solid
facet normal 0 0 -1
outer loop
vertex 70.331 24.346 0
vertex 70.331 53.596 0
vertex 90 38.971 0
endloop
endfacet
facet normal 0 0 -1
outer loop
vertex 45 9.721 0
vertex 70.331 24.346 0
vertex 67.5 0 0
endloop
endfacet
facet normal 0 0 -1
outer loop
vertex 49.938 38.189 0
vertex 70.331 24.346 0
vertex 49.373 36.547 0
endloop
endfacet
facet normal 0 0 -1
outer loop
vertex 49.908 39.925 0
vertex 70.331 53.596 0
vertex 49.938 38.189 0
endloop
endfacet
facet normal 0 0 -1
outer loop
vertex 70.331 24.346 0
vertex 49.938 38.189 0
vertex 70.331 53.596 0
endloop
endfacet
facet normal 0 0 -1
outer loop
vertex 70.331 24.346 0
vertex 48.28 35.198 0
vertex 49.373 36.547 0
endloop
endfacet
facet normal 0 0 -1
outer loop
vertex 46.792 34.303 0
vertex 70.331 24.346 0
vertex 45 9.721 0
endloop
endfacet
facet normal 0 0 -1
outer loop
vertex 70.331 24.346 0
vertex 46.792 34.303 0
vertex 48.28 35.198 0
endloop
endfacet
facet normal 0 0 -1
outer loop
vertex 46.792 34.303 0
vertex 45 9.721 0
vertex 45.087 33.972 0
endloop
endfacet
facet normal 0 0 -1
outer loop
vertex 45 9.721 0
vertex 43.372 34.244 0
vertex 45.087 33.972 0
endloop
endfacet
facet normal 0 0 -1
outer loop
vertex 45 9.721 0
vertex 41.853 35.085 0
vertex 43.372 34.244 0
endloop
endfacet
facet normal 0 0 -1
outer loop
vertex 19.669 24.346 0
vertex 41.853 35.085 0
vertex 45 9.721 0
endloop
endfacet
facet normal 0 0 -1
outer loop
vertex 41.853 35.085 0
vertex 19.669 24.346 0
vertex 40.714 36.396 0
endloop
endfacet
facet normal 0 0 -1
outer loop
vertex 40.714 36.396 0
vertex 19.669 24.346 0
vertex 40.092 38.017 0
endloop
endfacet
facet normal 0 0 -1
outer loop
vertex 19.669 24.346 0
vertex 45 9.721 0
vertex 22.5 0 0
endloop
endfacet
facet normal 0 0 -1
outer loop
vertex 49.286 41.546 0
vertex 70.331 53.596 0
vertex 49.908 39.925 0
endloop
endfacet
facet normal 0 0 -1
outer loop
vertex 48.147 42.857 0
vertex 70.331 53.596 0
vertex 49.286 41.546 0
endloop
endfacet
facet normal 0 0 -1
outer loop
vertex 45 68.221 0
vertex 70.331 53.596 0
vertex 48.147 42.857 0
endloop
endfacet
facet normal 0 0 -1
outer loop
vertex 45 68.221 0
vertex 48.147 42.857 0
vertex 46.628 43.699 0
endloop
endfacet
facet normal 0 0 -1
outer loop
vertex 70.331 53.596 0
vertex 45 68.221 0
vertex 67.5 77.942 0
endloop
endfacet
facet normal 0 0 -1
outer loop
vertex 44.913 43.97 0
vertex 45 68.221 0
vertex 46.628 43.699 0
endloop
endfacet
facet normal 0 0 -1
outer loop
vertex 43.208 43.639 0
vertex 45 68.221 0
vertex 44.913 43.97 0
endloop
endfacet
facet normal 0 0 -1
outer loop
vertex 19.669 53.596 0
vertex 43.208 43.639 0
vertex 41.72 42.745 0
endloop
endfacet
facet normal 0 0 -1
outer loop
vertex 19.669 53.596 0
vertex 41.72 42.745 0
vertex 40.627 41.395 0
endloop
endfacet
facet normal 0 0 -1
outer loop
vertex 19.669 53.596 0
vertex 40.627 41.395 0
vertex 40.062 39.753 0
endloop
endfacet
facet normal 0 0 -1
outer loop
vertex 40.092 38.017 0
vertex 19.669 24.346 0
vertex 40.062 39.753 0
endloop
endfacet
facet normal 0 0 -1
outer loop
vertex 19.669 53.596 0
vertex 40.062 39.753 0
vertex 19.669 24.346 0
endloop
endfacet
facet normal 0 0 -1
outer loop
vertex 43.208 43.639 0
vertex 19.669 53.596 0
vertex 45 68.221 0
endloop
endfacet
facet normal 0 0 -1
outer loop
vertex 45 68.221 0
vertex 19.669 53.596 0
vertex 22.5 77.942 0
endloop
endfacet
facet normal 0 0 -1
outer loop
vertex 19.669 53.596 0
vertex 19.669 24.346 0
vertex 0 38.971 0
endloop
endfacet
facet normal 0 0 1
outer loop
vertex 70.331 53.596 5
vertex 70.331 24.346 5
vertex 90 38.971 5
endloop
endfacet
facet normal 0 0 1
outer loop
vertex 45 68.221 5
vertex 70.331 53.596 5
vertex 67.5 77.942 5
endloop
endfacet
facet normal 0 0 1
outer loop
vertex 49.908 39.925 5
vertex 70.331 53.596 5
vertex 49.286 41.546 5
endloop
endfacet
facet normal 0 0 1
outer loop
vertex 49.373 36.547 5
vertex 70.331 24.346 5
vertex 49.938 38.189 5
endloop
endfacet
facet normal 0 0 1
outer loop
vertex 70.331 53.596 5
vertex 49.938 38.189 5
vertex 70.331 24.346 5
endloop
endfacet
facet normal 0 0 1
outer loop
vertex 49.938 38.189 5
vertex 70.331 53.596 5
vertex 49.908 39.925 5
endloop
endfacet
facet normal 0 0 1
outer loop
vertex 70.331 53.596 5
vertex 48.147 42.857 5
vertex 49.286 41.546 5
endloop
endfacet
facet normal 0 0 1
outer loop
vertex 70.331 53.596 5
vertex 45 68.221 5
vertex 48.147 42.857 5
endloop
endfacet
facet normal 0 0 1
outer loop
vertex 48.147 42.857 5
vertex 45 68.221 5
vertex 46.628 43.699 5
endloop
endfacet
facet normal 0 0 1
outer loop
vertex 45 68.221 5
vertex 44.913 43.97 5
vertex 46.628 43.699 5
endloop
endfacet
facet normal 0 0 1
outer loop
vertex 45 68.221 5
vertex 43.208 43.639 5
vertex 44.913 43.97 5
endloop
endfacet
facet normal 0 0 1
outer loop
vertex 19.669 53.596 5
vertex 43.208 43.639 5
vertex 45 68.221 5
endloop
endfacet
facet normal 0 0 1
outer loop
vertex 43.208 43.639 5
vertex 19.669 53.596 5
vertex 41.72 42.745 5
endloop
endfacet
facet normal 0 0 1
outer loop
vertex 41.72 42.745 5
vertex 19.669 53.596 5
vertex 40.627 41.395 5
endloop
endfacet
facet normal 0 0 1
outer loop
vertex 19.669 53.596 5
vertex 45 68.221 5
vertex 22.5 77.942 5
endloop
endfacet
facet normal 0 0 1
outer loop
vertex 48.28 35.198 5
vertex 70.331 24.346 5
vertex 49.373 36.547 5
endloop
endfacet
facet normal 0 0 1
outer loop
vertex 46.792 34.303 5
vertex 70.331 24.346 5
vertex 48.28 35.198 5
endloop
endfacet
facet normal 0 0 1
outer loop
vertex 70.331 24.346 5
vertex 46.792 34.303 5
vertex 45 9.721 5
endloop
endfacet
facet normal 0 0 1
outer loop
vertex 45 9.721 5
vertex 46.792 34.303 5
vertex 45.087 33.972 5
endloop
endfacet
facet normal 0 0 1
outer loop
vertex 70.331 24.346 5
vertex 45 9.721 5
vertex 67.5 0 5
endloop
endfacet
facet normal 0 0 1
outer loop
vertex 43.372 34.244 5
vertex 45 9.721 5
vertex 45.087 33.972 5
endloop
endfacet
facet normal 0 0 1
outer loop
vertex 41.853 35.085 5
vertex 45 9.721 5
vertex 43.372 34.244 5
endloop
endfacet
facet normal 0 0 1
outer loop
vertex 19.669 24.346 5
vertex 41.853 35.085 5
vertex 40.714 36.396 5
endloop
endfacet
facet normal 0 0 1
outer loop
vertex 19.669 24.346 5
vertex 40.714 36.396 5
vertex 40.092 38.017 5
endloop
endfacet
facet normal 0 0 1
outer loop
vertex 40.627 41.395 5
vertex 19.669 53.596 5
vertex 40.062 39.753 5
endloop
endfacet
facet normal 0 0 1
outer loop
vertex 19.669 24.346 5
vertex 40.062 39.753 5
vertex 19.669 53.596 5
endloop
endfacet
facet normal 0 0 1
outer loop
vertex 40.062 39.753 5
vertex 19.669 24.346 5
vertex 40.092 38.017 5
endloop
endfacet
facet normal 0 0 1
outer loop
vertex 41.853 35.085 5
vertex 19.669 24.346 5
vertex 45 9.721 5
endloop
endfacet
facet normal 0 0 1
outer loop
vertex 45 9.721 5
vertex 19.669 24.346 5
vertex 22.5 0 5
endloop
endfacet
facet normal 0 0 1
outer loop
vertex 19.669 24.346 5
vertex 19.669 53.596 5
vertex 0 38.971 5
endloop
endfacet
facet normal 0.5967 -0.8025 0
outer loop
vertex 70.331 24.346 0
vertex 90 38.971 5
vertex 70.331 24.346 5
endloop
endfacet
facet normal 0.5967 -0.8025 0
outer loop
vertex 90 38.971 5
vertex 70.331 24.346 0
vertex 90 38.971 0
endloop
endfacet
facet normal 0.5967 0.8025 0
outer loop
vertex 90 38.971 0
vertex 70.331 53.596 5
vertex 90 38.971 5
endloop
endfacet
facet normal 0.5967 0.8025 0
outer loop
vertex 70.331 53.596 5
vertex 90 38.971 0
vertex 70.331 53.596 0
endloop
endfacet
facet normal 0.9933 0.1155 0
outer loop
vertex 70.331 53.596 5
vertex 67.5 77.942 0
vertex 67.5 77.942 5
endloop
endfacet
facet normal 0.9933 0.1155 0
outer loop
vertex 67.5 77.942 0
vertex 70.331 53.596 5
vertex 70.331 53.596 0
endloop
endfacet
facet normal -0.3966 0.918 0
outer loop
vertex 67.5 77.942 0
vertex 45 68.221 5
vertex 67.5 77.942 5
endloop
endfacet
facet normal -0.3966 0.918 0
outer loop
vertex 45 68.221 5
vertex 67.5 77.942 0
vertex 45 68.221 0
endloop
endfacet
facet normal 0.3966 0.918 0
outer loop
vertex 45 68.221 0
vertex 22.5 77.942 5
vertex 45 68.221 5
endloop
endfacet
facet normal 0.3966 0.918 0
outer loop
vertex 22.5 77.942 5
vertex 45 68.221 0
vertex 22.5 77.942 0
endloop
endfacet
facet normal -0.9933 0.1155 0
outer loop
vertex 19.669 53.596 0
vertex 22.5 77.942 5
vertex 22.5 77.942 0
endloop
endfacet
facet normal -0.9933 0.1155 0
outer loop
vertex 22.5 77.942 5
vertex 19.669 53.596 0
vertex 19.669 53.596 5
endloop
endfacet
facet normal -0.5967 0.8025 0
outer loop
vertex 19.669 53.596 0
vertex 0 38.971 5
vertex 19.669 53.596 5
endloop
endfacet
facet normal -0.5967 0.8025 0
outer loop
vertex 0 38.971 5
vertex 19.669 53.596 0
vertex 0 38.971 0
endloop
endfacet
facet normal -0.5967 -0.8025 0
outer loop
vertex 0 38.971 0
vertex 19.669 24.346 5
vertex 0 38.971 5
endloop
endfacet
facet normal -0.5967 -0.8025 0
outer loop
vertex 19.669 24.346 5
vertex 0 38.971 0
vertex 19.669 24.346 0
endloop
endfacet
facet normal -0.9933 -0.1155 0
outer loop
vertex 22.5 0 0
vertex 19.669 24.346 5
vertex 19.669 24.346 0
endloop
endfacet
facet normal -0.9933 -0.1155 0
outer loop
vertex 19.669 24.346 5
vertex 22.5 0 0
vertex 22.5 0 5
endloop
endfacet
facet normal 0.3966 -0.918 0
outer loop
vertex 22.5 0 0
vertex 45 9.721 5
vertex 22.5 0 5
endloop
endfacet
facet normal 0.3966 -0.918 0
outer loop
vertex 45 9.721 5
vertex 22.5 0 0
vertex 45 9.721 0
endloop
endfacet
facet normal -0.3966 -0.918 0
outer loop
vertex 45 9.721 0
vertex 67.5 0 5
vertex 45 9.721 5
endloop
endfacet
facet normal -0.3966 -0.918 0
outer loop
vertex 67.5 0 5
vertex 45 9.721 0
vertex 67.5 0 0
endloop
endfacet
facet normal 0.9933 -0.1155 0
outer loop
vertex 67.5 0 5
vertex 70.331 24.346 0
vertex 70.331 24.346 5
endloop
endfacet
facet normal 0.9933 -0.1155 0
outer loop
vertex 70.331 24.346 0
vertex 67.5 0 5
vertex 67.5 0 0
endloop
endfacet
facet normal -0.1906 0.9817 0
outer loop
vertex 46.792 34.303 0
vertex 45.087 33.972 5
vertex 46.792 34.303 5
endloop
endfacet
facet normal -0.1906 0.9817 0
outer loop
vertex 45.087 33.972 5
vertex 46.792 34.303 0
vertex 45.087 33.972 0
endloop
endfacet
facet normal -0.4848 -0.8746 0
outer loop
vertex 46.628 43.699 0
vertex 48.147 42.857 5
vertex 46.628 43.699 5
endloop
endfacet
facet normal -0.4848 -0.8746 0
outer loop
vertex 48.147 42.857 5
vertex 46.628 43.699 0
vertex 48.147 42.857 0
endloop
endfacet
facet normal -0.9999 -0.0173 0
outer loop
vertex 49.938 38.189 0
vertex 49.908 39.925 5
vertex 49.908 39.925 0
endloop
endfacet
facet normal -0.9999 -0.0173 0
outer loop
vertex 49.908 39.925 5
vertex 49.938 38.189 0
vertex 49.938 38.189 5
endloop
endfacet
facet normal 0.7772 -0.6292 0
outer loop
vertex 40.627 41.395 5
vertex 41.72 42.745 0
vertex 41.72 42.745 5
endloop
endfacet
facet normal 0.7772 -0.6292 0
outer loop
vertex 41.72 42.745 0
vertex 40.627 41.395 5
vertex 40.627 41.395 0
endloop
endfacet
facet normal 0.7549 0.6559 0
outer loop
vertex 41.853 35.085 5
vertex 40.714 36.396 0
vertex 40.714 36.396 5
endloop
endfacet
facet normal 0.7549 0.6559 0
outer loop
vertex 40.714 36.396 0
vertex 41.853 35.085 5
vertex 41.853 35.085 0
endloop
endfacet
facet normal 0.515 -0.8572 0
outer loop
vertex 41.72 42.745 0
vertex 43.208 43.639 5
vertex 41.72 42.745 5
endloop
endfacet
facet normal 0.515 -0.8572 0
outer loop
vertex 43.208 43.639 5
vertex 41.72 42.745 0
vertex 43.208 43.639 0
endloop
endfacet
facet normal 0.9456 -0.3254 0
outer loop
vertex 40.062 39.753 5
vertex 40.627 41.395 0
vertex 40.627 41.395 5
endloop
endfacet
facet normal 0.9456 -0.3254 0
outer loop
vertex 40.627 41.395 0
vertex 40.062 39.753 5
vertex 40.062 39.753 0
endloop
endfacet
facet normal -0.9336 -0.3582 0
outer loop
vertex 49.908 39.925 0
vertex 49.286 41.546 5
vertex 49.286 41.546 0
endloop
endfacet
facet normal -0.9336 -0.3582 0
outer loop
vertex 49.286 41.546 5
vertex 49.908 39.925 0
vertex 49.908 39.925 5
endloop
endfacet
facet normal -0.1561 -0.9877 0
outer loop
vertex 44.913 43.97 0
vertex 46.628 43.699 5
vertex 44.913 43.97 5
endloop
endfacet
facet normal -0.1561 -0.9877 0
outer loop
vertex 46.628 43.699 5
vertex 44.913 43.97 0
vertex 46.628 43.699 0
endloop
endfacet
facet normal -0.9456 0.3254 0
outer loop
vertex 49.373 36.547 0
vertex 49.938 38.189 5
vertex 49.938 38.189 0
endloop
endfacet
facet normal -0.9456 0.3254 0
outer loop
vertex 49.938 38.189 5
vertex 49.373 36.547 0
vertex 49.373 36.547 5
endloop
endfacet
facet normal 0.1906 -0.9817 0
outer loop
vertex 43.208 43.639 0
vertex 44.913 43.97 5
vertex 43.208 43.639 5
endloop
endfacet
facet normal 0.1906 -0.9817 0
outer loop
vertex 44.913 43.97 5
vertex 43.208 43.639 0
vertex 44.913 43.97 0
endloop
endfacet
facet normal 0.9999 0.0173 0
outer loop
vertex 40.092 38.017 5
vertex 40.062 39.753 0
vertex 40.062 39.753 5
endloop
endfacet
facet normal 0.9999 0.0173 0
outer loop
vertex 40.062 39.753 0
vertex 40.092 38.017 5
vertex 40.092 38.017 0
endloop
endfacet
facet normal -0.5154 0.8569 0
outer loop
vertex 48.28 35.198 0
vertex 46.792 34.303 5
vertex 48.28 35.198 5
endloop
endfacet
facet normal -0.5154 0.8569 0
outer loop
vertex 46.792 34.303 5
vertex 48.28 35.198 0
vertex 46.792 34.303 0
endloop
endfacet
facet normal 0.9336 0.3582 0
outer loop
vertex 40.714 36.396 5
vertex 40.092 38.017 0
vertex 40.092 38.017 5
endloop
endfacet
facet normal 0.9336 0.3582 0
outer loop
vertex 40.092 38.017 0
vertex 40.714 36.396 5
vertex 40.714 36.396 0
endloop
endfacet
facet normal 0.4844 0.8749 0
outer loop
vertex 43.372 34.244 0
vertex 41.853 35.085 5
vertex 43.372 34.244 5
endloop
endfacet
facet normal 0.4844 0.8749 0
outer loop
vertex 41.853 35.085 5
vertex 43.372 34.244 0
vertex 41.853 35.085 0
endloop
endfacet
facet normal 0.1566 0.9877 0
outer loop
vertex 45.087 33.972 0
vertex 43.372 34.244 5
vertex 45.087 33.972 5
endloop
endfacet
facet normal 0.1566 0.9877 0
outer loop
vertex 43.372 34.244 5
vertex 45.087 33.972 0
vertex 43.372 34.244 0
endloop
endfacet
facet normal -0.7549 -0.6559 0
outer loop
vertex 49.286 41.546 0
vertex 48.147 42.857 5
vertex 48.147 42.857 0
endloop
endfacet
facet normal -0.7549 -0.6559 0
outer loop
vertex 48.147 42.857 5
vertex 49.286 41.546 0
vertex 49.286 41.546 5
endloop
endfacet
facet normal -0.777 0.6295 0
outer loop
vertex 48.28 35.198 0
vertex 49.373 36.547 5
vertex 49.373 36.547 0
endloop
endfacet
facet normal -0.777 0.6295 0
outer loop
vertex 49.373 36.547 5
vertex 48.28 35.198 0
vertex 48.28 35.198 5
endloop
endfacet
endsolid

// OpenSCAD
$fn = 32;

// ----------------------------------------------------------------------
// Star wheel: 6-point blunt, R45
// ----------------------------------------------------------------------

// --- parameters (mm) ---
n_points = 6;             // number of points / teeth
r_out = 45;               // tip radius
r_in = 29.25;             // root radius
bore_r = 5;               // centre bore radius
plate_t = 5;              // plate thickness, Z (extrusion height)
bore_d = 10;              // centre bore diameter

profile = [[0, 38.971], [19.669, 24.346], [22.5, 0], [45, 9.721], [67.5, 0], [70.331, 24.346], [90, 38.971], [70.331, 53.596], [67.5, 77.942], [45, 68.221], [22.5, 77.942], [19.669, 53.596]];  // primary outline, 12 points, counter clockwise
void_1 = [[49.908, 39.925], [49.286, 41.546], [48.147, 42.857], [46.628, 43.699], [44.913, 43.97], [43.208, 43.639], [41.72, 42.745], [40.627, 41.395], [40.062, 39.753], [40.092, 38.017], [40.714, 36.396], [41.853, 35.085], [43.372, 34.244], [45.087, 33.972], [46.792, 34.303], [48.28, 35.198], [49.373, 36.547], [49.938, 38.189]];  // centre bore, 18 points

// --- the one profile operation ---
difference() {
  linear_extrude(height = plate_t) polygon(points = profile);
  translate([0, 0, -1])
    linear_extrude(height = plate_t + 2) polygon(points = void_1);
}
